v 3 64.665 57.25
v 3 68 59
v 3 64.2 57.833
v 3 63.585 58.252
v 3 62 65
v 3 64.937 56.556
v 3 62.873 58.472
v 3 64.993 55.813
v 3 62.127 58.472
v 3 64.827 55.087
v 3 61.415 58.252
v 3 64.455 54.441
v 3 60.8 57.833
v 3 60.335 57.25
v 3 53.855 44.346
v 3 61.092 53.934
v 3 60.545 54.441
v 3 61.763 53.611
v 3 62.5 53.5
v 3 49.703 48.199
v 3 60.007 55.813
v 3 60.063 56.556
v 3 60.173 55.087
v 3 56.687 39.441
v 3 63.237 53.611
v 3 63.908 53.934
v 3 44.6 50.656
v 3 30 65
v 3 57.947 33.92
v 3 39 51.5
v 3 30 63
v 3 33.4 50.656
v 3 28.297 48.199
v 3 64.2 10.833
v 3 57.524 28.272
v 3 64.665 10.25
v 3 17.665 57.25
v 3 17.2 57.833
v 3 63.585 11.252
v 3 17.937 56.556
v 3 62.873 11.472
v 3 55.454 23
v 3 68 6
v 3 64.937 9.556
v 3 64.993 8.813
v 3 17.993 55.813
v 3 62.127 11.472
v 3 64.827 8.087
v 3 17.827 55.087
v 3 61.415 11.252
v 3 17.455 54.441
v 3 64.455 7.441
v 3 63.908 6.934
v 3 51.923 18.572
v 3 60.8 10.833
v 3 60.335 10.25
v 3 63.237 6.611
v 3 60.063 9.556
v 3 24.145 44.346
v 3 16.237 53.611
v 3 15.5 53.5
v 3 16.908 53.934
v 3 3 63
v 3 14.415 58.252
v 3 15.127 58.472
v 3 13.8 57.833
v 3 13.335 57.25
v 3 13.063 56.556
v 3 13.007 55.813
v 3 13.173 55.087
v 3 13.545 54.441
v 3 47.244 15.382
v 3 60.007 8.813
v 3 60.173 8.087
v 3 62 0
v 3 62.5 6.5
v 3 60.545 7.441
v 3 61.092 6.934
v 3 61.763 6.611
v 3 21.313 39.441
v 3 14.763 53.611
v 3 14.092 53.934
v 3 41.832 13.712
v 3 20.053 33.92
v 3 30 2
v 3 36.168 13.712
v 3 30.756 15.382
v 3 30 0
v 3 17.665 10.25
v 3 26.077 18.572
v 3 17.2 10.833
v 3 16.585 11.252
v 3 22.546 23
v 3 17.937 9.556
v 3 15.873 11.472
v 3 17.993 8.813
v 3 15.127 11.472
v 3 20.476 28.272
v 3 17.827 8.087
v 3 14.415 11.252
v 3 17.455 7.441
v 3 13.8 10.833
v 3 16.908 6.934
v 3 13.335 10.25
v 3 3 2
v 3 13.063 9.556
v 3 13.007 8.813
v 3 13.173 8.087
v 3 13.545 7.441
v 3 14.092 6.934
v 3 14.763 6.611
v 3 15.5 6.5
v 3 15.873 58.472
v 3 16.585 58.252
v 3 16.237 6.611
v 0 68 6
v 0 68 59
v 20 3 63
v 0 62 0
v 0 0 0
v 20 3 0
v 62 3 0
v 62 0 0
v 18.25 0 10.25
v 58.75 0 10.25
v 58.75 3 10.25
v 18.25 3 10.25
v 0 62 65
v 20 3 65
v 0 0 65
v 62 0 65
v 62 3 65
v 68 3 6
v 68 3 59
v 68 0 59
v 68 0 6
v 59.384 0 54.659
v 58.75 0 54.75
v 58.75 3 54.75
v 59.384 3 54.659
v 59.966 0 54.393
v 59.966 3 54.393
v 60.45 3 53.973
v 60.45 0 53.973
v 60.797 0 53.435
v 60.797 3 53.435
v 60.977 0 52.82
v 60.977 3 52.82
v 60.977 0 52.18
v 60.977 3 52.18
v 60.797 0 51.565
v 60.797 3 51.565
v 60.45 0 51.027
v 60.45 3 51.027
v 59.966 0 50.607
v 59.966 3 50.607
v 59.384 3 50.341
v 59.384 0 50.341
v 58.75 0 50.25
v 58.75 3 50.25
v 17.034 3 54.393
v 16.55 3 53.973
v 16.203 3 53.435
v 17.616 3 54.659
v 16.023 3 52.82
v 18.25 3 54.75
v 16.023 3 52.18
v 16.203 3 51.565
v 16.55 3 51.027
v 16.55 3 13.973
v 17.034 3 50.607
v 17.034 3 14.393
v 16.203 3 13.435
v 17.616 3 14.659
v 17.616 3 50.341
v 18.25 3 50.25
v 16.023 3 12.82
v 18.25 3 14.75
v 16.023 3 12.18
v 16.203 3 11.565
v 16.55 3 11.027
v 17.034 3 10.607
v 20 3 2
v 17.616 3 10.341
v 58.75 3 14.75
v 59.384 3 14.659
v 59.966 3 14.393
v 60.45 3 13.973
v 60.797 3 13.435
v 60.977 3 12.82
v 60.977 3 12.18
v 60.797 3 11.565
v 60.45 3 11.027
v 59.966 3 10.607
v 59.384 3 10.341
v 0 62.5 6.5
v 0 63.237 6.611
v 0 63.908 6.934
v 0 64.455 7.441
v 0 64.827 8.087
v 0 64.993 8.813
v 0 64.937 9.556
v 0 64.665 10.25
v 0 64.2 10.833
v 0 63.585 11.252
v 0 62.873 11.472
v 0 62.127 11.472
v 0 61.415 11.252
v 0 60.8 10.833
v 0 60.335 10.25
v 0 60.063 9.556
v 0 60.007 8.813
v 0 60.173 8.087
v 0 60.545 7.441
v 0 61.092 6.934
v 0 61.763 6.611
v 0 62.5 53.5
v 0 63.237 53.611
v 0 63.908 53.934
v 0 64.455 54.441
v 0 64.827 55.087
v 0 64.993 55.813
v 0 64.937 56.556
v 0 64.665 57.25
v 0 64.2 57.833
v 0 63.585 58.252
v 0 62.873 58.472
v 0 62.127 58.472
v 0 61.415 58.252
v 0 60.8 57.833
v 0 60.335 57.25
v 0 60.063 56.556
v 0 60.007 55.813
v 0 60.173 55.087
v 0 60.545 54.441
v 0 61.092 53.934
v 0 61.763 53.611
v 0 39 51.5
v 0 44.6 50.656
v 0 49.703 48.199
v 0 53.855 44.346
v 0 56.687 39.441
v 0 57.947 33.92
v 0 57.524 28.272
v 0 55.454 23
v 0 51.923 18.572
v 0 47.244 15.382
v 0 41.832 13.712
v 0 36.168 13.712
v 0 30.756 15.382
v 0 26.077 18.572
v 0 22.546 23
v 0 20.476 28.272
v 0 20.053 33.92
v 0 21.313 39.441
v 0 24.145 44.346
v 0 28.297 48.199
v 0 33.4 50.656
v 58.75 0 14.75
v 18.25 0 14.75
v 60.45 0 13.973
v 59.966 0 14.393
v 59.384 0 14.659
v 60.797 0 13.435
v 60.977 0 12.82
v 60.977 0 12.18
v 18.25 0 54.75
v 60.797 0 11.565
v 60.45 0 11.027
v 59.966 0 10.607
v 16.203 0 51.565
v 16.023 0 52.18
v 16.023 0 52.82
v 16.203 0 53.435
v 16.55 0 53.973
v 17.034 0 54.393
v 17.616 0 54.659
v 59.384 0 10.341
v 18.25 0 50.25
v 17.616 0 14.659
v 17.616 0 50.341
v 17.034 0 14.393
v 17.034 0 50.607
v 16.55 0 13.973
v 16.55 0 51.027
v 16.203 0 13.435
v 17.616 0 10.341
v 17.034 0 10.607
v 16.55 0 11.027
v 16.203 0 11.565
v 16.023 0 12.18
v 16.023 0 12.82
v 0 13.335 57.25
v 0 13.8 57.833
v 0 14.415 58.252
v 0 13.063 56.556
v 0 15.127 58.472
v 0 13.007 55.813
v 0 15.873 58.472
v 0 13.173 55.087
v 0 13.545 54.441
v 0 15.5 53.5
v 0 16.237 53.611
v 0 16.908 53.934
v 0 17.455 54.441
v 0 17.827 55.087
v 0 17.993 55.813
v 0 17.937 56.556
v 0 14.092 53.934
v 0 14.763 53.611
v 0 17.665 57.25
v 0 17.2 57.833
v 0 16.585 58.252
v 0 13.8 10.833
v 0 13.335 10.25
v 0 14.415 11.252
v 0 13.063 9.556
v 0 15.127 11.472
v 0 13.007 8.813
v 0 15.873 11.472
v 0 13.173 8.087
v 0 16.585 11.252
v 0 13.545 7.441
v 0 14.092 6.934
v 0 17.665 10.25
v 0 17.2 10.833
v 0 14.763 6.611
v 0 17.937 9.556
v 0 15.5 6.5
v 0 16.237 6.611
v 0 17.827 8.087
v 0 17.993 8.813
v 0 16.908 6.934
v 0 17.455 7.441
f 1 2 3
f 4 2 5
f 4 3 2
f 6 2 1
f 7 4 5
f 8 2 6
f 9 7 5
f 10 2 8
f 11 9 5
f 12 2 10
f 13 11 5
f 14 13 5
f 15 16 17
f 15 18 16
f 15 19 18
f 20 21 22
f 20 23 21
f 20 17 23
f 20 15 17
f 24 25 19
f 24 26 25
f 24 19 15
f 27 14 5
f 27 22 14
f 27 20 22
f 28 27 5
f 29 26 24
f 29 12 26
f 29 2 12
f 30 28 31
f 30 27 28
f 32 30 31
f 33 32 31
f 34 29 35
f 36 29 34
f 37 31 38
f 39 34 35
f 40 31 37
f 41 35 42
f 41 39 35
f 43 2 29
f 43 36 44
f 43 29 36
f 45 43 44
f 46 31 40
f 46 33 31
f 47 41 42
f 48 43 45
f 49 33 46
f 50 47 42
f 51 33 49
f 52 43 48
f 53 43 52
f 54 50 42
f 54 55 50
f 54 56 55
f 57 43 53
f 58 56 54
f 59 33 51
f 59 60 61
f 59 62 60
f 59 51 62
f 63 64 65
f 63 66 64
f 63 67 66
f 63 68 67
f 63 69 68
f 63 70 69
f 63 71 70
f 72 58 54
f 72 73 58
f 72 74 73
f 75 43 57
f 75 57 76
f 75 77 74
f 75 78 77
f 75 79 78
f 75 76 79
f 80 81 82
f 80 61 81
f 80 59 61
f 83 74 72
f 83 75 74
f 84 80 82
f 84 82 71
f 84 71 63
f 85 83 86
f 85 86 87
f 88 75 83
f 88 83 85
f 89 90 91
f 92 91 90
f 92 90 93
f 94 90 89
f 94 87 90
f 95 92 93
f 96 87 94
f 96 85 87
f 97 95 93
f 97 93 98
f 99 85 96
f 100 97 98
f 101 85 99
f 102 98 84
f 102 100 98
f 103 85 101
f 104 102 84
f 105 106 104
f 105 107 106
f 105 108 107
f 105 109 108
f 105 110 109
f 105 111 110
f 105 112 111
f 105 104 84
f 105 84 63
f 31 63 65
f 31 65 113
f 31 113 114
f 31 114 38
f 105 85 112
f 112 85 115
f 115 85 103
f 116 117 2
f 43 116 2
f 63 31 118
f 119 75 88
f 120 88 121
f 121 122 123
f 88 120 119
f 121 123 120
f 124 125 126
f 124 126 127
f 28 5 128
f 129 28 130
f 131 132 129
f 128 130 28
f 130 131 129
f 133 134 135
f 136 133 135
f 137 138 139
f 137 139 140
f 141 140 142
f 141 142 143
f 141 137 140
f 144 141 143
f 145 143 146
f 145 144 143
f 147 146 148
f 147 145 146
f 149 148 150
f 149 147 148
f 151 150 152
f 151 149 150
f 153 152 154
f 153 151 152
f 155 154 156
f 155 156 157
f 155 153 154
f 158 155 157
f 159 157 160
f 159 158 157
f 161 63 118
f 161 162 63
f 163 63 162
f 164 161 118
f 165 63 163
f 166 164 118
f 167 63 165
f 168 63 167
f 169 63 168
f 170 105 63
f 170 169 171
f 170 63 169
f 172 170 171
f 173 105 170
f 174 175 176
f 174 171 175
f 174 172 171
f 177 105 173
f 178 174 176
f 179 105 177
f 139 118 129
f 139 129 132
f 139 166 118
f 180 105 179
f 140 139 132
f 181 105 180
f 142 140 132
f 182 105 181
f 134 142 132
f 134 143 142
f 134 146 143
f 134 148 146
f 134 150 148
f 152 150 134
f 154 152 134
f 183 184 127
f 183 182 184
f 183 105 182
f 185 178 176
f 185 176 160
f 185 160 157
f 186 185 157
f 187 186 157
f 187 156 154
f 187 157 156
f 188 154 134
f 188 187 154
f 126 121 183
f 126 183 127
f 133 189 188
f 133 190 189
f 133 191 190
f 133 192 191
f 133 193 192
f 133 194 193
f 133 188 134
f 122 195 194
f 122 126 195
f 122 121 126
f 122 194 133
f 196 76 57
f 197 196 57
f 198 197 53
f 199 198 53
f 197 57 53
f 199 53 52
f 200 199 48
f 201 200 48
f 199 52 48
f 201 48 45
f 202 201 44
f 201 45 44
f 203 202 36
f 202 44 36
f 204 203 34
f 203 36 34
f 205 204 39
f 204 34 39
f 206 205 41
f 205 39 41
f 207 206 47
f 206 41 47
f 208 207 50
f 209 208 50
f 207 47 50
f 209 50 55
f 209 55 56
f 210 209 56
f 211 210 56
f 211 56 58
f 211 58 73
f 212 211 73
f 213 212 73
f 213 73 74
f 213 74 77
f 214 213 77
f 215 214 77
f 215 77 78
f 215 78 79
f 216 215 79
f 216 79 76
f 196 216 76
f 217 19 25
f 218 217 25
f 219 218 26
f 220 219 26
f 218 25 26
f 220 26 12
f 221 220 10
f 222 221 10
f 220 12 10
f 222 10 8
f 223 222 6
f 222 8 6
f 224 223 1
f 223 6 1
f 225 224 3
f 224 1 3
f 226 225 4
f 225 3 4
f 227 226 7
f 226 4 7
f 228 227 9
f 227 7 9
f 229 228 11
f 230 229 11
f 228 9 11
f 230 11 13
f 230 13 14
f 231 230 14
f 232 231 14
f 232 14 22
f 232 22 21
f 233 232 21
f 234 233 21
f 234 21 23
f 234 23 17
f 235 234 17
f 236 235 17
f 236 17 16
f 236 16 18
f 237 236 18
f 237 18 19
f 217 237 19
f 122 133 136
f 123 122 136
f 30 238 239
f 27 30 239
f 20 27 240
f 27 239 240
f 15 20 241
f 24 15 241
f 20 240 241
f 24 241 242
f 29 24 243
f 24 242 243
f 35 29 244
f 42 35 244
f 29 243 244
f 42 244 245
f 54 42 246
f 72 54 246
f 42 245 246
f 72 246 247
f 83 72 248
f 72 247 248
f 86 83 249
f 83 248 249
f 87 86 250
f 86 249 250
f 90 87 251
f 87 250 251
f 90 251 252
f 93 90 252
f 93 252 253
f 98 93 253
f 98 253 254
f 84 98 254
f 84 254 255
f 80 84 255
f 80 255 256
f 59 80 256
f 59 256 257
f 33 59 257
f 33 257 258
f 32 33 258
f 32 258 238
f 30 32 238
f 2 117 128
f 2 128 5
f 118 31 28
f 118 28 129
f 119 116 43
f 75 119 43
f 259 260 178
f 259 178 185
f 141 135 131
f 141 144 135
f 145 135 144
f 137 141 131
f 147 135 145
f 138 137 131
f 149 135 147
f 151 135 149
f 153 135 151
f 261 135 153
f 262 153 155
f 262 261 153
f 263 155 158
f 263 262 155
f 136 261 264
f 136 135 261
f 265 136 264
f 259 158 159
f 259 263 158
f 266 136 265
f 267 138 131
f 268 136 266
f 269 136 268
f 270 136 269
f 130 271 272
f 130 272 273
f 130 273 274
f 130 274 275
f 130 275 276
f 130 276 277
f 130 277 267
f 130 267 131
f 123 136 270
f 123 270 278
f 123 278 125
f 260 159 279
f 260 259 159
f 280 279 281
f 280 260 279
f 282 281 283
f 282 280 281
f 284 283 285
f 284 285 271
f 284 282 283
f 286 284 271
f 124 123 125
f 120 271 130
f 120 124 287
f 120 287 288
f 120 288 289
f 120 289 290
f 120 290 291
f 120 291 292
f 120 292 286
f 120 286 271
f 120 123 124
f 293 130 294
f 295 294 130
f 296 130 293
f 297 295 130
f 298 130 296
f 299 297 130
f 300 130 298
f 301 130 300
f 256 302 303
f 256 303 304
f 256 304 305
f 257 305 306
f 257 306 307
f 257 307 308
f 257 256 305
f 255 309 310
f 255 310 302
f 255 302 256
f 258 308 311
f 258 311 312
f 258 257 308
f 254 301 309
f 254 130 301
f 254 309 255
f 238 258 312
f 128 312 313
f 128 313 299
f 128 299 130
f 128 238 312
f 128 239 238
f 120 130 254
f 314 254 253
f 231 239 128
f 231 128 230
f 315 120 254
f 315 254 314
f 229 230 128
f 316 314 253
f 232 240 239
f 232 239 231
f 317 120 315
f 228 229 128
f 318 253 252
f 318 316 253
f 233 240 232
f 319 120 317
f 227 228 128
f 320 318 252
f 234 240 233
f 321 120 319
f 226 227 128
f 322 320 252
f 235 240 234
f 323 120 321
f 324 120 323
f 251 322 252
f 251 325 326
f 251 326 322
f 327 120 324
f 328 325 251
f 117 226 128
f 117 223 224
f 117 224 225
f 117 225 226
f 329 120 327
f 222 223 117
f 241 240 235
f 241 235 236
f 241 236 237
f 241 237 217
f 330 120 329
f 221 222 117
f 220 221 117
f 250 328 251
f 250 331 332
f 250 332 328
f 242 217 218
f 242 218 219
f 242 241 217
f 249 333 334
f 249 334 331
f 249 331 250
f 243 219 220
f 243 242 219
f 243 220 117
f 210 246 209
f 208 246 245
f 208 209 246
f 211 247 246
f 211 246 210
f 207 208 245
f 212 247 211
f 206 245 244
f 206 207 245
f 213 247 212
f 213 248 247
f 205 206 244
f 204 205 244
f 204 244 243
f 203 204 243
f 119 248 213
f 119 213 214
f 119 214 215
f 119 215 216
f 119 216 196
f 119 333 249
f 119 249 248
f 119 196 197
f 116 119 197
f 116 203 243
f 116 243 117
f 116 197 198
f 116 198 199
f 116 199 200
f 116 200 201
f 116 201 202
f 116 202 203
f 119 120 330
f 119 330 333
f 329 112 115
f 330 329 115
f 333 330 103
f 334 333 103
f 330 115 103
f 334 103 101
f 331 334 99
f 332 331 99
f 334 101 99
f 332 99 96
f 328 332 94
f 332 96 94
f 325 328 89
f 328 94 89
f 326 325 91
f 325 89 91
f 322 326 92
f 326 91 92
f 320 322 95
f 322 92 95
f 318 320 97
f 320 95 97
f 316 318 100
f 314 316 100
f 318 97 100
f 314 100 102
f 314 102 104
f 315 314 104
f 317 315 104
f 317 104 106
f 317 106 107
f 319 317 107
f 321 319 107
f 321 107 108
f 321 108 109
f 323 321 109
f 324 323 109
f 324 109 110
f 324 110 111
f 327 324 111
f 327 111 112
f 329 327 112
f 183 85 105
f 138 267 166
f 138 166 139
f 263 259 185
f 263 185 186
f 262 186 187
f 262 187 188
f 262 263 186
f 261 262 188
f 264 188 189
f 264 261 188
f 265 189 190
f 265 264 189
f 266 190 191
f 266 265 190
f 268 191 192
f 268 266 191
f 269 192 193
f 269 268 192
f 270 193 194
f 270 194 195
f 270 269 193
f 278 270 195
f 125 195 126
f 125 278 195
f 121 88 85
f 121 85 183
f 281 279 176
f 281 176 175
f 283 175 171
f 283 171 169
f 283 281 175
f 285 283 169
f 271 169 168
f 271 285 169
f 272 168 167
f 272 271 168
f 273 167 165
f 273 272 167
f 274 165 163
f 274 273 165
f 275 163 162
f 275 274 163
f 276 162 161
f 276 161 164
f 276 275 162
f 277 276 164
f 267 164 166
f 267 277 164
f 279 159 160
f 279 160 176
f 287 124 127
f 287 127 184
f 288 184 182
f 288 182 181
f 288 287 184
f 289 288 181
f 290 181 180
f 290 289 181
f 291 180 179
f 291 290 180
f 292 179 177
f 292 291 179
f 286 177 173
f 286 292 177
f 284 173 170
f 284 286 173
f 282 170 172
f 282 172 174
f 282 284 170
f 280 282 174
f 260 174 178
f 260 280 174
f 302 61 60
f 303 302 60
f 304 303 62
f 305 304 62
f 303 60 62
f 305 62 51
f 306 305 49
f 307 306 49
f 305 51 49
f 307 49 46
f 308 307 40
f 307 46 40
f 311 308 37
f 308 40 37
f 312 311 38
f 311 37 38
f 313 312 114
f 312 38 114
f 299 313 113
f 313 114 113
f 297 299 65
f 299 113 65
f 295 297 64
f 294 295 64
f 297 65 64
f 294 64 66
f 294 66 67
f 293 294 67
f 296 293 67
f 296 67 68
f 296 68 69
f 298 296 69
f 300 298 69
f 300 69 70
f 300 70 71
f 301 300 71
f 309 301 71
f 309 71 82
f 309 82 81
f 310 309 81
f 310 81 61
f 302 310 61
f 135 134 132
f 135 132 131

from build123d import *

# Parameters (mm, degrees)
EXTRUDE_1_DEPTH             = 65
HOLE_WIZARD_4_5_4_5_1_DEPTH = 3
SKETCH_4_R                  = 19
CUT_EXTRUDE_1_DEPTH         = 65
HOLE_WIZARD_5_0_5_1_D       = 5
CHAMFER_1_SIZE              = 6
RIB_18_REACH                = 118.073
SKETCH_9_WALL_W             = 266.052617732
SKETCH_9_WALL_H             = 2
RIB_19_REACH                = 118.073
SKETCH_8_WALL_W             = 266.052617732
SKETCH_8_WALL_H             = 2


# Read off the part's stored shape, not the designer's step: Ø4.5 (4.5) 直径槽口1
with BuildPart() as part:
    # 草图1 → 凸台-拉伸1 (new body)
    with BuildSketch(Plane.XY):
        Polygon((0, 0), (0, 68), (3, 68), (3, 3), (68, 3), (68, 0), align=None)
    extrude(amount=EXTRUDE_1_DEPTH)

    # Ø4.5 (4.5) 直径槽口1 outline → Ø4.5 (4.5) 直径槽口1 (cut)
    with BuildSketch(Plane(origin=(0, 0, 0), x_dir=(1, 0, 0), z_dir=(0, 1, 0))):
        with BuildLine():
            Line((18.25, -14.75), (58.75, -14.75))
            ThreePointArc((58.75, -14.75), (61, -12.5), (58.75, -10.25))
            Line((58.75, -10.25), (18.25, -10.25))
            ThreePointArc((18.25, -10.25), (16, -12.5), (18.25, -14.75))
        make_face()
        with BuildLine():
            Line((18.25, -54.75), (58.75, -54.75))
            ThreePointArc((58.75, -54.75), (61, -52.5), (58.75, -50.25))
            Line((58.75, -50.25), (18.25, -50.25))
            ThreePointArc((18.25, -50.25), (16, -52.5), (18.25, -54.75))
        make_face()
    extrude(amount=HOLE_WIZARD_4_5_4_5_1_DEPTH, mode=Mode.SUBTRACT)

    # 草图4 → 切除-拉伸1 (cut)
    with BuildSketch(Plane.ZY):
        with Locations((32.5, 39)):
            Circle(SKETCH_4_R)
    extrude(amount=-CUT_EXTRUDE_1_DEPTH, mode=Mode.SUBTRACT)

    # Ø5.0 (5) 直径孔1 (through all)
    with Locations(Plane.ZY):
        with Locations((9, 62.5), (56, 62.5), (9, 15.5), (56, 15.5)):
            Hole(HOLE_WIZARD_5_0_5_1_D / 2)

    # 倒角1
    chamfer_1_edges = [part.edges().sort_by_distance(p)[0] for p in [
        (1.5, 68, 65),
        (1.5, 68, 0),
        (68, 1.5, 65),
        (68, 1.5, 0),
    ]]
    chamfer(chamfer_1_edges, length=CHAMFER_1_SIZE)

    # 草图9 wall → 筋18 (add, up to next)
    with BuildSketch(Plane(origin=(11.5, 16.5, 0), x_dir=(0.532813269686, -0.84623284009, 0), z_dir=(0.84623284009, 0.532813269686, 0)), mode=Mode.PRIVATE) as rib_18_sk1:
        with Locations((0, -1)):
            Rectangle(SKETCH_9_WALL_W, SKETCH_9_WALL_H)
    rib_18_tool1 = extrude(rib_18_sk1.sketch, amount=-RIB_18_REACH, mode=Mode.PRIVATE) - part.part
    add(rib_18_tool1.solids().sort_by_distance((11.5, 16.5, 0))[0])

    # 草图8 wall → 筋19 (add, up to next)
    with BuildSketch(Plane(origin=(11.5, 16.5, 65), x_dir=(0.532813269686, -0.84623284009, 0), z_dir=(0.84623284009, 0.532813269686, 0)), mode=Mode.PRIVATE) as rib_19_sk1:
        with Locations((0, 1)):
            Rectangle(SKETCH_8_WALL_W, SKETCH_8_WALL_H)
    rib_19_tool1 = extrude(rib_19_sk1.sketch, amount=-RIB_19_REACH, mode=Mode.PRIVATE) - part.part
    add(rib_19_tool1.solids().sort_by_distance((11.5, 16.5, 65))[0])


solid = part.part
